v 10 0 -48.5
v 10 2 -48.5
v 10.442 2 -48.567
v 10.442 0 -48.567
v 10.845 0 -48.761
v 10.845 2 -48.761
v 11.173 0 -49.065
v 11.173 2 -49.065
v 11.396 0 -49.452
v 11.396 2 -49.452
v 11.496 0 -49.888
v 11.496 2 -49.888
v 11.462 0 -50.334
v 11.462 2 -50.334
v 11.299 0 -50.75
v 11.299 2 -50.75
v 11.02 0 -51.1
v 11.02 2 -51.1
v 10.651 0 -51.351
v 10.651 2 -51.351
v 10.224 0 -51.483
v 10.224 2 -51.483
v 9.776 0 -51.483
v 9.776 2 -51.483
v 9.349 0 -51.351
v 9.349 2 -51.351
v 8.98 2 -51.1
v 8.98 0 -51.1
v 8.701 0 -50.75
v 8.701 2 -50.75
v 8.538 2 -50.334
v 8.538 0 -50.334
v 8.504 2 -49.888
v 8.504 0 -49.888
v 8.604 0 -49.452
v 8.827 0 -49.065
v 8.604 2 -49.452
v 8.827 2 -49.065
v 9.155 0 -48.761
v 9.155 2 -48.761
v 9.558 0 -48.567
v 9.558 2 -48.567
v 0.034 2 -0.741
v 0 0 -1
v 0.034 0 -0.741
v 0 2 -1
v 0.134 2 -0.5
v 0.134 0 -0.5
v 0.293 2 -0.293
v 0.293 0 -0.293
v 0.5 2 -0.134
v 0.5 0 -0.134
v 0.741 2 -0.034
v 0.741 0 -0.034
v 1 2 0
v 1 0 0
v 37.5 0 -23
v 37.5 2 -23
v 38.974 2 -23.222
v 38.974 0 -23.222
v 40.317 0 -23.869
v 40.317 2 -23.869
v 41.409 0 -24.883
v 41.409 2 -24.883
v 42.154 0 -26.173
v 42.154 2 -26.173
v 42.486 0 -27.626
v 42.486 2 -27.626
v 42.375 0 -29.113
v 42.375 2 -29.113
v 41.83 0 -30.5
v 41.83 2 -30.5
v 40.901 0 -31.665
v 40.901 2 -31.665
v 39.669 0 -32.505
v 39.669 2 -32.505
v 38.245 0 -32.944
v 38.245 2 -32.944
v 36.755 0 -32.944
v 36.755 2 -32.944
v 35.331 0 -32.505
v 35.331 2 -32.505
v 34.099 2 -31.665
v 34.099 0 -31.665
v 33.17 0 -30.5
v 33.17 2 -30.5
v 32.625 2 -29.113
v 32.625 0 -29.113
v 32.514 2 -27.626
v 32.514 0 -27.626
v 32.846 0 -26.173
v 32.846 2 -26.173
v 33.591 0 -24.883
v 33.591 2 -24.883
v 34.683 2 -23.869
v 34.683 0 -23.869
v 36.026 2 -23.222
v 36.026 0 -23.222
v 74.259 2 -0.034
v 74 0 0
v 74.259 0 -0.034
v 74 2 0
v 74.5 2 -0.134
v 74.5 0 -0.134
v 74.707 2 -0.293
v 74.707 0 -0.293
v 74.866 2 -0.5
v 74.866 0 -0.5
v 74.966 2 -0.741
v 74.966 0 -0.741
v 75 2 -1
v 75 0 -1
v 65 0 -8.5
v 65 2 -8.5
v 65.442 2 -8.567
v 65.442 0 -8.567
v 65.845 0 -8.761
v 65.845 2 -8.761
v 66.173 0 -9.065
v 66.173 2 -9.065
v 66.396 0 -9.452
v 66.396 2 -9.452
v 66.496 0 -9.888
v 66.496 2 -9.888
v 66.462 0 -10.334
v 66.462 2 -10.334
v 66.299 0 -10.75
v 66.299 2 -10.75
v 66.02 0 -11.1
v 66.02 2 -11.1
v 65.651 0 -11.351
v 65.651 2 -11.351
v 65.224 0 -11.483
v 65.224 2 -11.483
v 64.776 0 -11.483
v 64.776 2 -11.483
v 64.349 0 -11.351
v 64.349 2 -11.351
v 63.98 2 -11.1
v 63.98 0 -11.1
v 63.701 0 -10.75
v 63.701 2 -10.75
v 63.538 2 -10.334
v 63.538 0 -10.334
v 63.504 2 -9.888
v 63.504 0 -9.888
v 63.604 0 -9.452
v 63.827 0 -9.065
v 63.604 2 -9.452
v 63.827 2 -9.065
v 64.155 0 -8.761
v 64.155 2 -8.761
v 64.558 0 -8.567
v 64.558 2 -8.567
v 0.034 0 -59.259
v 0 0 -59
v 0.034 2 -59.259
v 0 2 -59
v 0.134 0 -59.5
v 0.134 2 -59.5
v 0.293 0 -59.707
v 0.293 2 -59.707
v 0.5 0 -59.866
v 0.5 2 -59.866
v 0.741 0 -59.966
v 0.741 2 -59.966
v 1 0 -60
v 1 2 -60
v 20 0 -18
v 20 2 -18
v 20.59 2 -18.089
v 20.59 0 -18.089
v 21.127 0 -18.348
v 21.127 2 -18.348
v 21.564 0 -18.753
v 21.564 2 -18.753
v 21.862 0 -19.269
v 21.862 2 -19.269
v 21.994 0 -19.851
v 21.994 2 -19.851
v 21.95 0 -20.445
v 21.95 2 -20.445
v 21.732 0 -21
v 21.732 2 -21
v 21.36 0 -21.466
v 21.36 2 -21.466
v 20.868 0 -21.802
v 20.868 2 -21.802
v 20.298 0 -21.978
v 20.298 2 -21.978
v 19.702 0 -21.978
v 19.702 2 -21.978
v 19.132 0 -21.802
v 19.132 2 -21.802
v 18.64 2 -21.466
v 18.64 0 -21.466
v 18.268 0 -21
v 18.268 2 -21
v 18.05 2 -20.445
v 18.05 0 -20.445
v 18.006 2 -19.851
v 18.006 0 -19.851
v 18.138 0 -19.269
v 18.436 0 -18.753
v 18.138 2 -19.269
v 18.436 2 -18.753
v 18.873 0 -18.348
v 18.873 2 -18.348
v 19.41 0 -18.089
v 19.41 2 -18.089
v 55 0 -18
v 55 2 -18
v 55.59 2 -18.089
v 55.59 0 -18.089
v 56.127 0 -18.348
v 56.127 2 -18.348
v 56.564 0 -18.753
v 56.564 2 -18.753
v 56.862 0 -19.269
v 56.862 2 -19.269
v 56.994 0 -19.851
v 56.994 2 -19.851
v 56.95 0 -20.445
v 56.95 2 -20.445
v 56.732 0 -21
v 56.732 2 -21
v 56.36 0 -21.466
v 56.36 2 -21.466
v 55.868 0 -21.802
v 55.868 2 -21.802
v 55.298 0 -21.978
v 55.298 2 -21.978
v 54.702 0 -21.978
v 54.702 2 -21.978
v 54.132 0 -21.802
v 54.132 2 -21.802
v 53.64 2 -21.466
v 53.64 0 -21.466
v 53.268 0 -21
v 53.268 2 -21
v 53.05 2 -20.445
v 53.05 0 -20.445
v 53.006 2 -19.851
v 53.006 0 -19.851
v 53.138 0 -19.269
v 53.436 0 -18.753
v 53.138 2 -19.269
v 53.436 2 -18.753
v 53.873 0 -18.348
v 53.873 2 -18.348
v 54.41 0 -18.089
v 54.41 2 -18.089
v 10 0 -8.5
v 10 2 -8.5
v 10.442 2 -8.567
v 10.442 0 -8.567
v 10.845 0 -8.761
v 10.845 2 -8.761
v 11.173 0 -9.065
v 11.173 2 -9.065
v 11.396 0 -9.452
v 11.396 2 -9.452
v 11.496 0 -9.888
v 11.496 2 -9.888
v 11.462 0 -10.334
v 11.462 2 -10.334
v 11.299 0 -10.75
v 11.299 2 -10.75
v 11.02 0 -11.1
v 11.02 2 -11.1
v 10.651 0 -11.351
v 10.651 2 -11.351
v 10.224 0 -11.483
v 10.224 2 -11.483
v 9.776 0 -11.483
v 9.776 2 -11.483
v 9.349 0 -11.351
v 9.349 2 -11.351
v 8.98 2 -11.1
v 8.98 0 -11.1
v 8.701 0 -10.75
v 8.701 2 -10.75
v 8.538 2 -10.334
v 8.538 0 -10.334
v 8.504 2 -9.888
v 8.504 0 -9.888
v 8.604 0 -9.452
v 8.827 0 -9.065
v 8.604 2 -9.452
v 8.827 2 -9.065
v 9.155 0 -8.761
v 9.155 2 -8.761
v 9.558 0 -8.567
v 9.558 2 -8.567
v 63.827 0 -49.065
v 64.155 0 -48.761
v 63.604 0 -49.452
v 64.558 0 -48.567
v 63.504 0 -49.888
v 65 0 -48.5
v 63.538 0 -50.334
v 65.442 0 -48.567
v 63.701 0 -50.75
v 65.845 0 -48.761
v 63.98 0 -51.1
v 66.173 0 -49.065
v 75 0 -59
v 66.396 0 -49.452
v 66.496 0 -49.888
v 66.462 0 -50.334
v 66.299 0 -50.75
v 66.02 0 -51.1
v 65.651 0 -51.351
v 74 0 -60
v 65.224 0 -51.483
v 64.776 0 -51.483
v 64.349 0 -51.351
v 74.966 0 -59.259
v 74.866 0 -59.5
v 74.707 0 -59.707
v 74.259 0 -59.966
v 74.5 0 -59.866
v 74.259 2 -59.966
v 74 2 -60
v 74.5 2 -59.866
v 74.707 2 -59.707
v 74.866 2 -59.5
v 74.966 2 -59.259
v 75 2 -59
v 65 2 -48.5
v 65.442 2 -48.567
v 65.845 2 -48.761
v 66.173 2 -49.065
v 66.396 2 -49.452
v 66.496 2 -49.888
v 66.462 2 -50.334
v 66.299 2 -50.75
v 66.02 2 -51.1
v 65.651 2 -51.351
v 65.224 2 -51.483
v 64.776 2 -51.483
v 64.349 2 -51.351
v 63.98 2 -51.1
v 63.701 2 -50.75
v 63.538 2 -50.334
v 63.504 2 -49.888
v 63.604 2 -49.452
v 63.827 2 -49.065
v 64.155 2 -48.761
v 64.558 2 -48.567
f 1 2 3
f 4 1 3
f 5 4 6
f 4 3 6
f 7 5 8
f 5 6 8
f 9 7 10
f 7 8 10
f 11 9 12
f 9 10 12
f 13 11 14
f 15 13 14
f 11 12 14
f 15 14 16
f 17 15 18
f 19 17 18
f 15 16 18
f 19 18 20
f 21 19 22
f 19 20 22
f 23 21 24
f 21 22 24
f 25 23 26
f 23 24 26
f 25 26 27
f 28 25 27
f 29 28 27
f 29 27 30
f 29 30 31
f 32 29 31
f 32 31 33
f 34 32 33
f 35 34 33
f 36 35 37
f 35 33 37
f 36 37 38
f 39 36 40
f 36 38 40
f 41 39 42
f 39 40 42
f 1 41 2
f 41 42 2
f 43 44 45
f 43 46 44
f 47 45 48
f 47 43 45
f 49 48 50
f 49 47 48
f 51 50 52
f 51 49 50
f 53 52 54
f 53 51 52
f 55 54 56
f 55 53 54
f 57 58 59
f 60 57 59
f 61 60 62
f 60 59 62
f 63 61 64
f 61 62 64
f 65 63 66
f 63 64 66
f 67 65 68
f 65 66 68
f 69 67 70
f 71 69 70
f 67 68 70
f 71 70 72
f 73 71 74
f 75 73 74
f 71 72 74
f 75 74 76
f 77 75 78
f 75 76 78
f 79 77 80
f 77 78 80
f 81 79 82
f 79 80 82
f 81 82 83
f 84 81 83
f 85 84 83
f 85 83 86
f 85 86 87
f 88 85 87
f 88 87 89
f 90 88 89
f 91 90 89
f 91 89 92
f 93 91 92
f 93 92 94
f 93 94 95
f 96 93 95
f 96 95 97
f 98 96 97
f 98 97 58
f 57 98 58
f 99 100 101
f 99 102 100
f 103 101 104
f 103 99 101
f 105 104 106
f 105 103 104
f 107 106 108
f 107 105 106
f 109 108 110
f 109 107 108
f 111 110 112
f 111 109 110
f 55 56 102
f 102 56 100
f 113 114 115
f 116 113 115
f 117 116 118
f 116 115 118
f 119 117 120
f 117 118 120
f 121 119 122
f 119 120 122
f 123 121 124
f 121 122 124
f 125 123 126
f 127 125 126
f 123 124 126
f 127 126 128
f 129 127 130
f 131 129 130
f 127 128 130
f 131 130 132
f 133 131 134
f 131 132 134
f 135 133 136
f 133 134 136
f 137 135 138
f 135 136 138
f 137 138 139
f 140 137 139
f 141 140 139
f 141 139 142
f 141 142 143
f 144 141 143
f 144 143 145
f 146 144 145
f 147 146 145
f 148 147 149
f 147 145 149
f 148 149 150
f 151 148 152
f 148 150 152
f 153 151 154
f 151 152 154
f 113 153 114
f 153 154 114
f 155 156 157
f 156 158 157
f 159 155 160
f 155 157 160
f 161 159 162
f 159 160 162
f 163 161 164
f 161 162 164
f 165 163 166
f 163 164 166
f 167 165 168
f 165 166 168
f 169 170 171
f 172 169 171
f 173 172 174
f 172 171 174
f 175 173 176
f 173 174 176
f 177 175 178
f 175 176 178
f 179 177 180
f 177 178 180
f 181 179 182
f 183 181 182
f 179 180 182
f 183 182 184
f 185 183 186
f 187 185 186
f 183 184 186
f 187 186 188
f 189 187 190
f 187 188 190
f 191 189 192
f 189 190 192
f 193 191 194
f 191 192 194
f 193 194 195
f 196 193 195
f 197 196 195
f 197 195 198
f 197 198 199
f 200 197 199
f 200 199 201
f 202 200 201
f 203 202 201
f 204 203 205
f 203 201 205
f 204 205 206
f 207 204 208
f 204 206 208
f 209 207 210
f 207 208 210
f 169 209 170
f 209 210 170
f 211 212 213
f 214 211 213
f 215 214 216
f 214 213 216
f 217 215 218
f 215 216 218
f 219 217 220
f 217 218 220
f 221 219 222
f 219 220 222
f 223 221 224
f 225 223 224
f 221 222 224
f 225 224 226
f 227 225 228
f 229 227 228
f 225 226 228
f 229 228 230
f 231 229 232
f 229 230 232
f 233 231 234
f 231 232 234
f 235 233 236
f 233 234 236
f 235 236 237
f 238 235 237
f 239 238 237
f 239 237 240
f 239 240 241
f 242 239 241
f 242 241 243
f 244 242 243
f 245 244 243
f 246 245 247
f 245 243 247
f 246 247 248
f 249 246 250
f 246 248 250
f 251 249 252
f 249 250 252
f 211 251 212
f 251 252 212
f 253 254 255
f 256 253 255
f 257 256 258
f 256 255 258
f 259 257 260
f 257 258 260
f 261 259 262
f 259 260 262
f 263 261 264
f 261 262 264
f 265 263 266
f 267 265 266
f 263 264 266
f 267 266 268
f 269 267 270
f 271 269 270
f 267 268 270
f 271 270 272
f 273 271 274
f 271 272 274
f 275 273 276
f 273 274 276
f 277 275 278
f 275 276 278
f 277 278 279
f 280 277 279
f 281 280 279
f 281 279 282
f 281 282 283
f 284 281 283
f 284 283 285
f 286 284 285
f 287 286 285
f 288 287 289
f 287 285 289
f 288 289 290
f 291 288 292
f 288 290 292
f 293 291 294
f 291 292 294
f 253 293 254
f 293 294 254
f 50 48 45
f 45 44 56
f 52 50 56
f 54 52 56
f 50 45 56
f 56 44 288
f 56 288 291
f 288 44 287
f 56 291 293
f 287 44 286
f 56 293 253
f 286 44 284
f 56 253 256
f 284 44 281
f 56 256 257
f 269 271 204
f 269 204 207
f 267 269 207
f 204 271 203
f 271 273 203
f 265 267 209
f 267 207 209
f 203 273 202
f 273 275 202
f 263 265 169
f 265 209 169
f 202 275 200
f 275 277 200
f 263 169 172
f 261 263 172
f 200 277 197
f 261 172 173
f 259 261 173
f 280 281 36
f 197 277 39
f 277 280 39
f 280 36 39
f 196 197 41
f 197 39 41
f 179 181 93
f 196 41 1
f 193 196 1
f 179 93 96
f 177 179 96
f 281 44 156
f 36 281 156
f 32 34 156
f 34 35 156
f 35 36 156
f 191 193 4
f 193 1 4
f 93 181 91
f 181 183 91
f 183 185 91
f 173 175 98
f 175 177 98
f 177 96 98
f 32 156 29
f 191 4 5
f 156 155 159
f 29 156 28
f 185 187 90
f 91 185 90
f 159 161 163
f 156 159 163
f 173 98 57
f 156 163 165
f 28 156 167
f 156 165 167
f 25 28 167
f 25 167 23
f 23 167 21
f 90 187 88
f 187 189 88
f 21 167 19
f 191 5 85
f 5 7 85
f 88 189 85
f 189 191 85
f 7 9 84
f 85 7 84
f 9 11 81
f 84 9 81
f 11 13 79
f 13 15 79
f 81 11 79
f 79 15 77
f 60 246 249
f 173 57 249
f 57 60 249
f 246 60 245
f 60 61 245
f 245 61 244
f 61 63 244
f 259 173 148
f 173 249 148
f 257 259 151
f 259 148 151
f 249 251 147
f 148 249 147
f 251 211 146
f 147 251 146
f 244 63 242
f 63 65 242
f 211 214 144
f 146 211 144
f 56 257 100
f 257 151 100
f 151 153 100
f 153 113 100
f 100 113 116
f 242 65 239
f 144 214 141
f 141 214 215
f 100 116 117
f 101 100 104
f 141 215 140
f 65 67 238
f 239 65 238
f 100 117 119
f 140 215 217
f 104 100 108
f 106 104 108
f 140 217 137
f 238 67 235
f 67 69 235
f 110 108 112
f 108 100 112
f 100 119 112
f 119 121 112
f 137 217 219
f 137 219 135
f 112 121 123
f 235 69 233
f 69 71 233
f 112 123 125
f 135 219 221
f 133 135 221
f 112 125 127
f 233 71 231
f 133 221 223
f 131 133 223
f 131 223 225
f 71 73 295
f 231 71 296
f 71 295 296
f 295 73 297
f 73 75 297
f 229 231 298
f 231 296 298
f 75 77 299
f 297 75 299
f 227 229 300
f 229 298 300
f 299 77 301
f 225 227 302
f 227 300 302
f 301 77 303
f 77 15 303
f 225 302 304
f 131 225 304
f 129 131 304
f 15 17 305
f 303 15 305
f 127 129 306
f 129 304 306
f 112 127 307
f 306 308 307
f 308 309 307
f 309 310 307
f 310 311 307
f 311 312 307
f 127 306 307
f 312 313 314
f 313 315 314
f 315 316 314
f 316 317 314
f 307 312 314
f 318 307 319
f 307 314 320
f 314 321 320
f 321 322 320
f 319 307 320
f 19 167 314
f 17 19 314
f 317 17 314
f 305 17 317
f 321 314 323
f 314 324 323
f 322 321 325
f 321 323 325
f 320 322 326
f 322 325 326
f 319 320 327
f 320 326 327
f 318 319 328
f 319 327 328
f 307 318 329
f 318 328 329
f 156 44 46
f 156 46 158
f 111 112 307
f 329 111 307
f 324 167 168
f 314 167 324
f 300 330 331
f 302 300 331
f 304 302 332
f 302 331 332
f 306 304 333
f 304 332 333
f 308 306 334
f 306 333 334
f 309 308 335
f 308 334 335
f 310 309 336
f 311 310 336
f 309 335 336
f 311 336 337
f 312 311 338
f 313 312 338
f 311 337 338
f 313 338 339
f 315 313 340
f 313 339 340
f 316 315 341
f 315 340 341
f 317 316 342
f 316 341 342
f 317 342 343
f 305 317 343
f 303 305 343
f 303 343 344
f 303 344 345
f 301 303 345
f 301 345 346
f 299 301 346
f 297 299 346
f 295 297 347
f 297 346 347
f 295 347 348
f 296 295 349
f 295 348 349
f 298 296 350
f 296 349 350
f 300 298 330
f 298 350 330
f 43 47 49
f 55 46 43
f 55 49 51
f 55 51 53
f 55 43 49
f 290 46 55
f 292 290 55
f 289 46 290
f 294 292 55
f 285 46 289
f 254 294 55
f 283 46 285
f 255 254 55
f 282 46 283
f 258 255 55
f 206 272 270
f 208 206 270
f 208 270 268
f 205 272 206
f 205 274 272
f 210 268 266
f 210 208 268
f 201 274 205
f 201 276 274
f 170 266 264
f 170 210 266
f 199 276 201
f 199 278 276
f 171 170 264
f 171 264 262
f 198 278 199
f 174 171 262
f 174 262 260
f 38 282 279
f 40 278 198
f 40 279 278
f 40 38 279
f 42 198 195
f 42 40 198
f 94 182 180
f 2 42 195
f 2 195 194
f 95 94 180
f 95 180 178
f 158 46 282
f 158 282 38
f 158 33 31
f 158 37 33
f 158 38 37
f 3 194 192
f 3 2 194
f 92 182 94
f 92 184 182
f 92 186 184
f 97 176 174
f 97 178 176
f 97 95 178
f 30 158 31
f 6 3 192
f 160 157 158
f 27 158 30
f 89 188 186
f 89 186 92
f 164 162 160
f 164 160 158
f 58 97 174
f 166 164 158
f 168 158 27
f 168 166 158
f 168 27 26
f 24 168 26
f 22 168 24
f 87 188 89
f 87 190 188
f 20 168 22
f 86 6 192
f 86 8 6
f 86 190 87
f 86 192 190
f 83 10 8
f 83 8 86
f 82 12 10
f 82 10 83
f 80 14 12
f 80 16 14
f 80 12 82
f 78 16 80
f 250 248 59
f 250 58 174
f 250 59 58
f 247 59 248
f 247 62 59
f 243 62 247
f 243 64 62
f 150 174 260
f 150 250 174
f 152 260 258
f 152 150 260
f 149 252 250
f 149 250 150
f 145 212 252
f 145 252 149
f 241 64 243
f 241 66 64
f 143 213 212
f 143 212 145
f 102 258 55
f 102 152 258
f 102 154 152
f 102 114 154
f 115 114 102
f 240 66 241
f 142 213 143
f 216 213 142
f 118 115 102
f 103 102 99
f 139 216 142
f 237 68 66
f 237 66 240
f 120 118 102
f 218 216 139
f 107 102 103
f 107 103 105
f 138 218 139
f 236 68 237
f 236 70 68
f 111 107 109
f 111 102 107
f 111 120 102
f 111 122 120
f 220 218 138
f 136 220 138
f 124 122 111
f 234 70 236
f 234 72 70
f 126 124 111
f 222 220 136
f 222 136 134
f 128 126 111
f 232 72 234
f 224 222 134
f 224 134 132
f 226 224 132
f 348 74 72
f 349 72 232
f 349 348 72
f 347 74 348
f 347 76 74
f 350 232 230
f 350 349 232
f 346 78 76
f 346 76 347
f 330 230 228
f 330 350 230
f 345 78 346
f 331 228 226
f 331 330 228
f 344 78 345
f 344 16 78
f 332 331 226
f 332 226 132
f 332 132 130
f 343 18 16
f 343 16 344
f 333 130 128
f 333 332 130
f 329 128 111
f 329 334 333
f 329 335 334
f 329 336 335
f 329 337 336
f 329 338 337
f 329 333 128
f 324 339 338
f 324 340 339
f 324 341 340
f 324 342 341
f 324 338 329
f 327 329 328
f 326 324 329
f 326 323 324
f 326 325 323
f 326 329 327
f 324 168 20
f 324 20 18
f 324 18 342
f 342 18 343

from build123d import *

# Parameters (mm, degrees)
SKETCH2_W           = 75
SKETCH2_H           = 60
BOSS_EXTRUDE1_DEPTH = 2
SKETCH4_R           = 1.5
SKETCH4_R_2         = 2
CUT_EXTRUDE2_DEPTH  = 2
SKETCH5_R           = 5
CUT_EXTRUDE3_DEPTH  = 40
FILLET1_R           = 1


with BuildPart() as part:
    # Sketch2 → Boss-Extrude1 (new body)
    with BuildSketch(Plane(origin=(0, 0, 0), x_dir=(1, 0, 0), z_dir=(0, 1, 0))):
        with Locations((37.5, 30)):
            Rectangle(SKETCH2_W, SKETCH2_H)
    extrude(amount=BOSS_EXTRUDE1_DEPTH)

    # Sketch4 → Cut-Extrude2 (cut)
    with BuildSketch(Plane(origin=(0, 2, 0), x_dir=(1, 0, 0), z_dir=(0, 1, 0))):
        with Locations(Location((10, 10, 0), (0, 0, 270))):
            Circle(SKETCH4_R)
        with Locations(Location((65, 10, 0), (0, 0, 270))):
            Circle(SKETCH4_R)
        with Locations(Location((20, 20, 0), (0, 0, 270))):
            Circle(SKETCH4_R_2)
        with Locations(Location((55, 20, 0), (0, 0, 270))):
            Circle(SKETCH4_R_2)
        with Locations(Location((10, 50, 0), (0, 0, 270))):
            Circle(SKETCH4_R)
        with Locations(Location((65, 50, 0), (0, 0, 270))):
            Circle(SKETCH4_R)
    extrude(amount=-CUT_EXTRUDE2_DEPTH, mode=Mode.SUBTRACT)

    # Sketch5 → Cut-Extrude3 (cut)
    with BuildSketch(Plane(origin=(0, 2, 0), x_dir=(1, 0, 0), z_dir=(0, 1, 0))):
        with Locations(Location((37.5, 28, 0), (0, 0, 270))):
            Circle(SKETCH5_R)
    extrude(amount=-CUT_EXTRUDE3_DEPTH, mode=Mode.SUBTRACT)

    # Fillet1
    fillet1_edges = [part.edges().sort_by_distance(p)[0] for p in [
        (0, 1, -60),
        (75, 1, -60),
        (75, 1, 0),
        (0, 1, 0),
    ]]
    fillet(fillet1_edges, radius=FILLET1_R)


solid = part.part
